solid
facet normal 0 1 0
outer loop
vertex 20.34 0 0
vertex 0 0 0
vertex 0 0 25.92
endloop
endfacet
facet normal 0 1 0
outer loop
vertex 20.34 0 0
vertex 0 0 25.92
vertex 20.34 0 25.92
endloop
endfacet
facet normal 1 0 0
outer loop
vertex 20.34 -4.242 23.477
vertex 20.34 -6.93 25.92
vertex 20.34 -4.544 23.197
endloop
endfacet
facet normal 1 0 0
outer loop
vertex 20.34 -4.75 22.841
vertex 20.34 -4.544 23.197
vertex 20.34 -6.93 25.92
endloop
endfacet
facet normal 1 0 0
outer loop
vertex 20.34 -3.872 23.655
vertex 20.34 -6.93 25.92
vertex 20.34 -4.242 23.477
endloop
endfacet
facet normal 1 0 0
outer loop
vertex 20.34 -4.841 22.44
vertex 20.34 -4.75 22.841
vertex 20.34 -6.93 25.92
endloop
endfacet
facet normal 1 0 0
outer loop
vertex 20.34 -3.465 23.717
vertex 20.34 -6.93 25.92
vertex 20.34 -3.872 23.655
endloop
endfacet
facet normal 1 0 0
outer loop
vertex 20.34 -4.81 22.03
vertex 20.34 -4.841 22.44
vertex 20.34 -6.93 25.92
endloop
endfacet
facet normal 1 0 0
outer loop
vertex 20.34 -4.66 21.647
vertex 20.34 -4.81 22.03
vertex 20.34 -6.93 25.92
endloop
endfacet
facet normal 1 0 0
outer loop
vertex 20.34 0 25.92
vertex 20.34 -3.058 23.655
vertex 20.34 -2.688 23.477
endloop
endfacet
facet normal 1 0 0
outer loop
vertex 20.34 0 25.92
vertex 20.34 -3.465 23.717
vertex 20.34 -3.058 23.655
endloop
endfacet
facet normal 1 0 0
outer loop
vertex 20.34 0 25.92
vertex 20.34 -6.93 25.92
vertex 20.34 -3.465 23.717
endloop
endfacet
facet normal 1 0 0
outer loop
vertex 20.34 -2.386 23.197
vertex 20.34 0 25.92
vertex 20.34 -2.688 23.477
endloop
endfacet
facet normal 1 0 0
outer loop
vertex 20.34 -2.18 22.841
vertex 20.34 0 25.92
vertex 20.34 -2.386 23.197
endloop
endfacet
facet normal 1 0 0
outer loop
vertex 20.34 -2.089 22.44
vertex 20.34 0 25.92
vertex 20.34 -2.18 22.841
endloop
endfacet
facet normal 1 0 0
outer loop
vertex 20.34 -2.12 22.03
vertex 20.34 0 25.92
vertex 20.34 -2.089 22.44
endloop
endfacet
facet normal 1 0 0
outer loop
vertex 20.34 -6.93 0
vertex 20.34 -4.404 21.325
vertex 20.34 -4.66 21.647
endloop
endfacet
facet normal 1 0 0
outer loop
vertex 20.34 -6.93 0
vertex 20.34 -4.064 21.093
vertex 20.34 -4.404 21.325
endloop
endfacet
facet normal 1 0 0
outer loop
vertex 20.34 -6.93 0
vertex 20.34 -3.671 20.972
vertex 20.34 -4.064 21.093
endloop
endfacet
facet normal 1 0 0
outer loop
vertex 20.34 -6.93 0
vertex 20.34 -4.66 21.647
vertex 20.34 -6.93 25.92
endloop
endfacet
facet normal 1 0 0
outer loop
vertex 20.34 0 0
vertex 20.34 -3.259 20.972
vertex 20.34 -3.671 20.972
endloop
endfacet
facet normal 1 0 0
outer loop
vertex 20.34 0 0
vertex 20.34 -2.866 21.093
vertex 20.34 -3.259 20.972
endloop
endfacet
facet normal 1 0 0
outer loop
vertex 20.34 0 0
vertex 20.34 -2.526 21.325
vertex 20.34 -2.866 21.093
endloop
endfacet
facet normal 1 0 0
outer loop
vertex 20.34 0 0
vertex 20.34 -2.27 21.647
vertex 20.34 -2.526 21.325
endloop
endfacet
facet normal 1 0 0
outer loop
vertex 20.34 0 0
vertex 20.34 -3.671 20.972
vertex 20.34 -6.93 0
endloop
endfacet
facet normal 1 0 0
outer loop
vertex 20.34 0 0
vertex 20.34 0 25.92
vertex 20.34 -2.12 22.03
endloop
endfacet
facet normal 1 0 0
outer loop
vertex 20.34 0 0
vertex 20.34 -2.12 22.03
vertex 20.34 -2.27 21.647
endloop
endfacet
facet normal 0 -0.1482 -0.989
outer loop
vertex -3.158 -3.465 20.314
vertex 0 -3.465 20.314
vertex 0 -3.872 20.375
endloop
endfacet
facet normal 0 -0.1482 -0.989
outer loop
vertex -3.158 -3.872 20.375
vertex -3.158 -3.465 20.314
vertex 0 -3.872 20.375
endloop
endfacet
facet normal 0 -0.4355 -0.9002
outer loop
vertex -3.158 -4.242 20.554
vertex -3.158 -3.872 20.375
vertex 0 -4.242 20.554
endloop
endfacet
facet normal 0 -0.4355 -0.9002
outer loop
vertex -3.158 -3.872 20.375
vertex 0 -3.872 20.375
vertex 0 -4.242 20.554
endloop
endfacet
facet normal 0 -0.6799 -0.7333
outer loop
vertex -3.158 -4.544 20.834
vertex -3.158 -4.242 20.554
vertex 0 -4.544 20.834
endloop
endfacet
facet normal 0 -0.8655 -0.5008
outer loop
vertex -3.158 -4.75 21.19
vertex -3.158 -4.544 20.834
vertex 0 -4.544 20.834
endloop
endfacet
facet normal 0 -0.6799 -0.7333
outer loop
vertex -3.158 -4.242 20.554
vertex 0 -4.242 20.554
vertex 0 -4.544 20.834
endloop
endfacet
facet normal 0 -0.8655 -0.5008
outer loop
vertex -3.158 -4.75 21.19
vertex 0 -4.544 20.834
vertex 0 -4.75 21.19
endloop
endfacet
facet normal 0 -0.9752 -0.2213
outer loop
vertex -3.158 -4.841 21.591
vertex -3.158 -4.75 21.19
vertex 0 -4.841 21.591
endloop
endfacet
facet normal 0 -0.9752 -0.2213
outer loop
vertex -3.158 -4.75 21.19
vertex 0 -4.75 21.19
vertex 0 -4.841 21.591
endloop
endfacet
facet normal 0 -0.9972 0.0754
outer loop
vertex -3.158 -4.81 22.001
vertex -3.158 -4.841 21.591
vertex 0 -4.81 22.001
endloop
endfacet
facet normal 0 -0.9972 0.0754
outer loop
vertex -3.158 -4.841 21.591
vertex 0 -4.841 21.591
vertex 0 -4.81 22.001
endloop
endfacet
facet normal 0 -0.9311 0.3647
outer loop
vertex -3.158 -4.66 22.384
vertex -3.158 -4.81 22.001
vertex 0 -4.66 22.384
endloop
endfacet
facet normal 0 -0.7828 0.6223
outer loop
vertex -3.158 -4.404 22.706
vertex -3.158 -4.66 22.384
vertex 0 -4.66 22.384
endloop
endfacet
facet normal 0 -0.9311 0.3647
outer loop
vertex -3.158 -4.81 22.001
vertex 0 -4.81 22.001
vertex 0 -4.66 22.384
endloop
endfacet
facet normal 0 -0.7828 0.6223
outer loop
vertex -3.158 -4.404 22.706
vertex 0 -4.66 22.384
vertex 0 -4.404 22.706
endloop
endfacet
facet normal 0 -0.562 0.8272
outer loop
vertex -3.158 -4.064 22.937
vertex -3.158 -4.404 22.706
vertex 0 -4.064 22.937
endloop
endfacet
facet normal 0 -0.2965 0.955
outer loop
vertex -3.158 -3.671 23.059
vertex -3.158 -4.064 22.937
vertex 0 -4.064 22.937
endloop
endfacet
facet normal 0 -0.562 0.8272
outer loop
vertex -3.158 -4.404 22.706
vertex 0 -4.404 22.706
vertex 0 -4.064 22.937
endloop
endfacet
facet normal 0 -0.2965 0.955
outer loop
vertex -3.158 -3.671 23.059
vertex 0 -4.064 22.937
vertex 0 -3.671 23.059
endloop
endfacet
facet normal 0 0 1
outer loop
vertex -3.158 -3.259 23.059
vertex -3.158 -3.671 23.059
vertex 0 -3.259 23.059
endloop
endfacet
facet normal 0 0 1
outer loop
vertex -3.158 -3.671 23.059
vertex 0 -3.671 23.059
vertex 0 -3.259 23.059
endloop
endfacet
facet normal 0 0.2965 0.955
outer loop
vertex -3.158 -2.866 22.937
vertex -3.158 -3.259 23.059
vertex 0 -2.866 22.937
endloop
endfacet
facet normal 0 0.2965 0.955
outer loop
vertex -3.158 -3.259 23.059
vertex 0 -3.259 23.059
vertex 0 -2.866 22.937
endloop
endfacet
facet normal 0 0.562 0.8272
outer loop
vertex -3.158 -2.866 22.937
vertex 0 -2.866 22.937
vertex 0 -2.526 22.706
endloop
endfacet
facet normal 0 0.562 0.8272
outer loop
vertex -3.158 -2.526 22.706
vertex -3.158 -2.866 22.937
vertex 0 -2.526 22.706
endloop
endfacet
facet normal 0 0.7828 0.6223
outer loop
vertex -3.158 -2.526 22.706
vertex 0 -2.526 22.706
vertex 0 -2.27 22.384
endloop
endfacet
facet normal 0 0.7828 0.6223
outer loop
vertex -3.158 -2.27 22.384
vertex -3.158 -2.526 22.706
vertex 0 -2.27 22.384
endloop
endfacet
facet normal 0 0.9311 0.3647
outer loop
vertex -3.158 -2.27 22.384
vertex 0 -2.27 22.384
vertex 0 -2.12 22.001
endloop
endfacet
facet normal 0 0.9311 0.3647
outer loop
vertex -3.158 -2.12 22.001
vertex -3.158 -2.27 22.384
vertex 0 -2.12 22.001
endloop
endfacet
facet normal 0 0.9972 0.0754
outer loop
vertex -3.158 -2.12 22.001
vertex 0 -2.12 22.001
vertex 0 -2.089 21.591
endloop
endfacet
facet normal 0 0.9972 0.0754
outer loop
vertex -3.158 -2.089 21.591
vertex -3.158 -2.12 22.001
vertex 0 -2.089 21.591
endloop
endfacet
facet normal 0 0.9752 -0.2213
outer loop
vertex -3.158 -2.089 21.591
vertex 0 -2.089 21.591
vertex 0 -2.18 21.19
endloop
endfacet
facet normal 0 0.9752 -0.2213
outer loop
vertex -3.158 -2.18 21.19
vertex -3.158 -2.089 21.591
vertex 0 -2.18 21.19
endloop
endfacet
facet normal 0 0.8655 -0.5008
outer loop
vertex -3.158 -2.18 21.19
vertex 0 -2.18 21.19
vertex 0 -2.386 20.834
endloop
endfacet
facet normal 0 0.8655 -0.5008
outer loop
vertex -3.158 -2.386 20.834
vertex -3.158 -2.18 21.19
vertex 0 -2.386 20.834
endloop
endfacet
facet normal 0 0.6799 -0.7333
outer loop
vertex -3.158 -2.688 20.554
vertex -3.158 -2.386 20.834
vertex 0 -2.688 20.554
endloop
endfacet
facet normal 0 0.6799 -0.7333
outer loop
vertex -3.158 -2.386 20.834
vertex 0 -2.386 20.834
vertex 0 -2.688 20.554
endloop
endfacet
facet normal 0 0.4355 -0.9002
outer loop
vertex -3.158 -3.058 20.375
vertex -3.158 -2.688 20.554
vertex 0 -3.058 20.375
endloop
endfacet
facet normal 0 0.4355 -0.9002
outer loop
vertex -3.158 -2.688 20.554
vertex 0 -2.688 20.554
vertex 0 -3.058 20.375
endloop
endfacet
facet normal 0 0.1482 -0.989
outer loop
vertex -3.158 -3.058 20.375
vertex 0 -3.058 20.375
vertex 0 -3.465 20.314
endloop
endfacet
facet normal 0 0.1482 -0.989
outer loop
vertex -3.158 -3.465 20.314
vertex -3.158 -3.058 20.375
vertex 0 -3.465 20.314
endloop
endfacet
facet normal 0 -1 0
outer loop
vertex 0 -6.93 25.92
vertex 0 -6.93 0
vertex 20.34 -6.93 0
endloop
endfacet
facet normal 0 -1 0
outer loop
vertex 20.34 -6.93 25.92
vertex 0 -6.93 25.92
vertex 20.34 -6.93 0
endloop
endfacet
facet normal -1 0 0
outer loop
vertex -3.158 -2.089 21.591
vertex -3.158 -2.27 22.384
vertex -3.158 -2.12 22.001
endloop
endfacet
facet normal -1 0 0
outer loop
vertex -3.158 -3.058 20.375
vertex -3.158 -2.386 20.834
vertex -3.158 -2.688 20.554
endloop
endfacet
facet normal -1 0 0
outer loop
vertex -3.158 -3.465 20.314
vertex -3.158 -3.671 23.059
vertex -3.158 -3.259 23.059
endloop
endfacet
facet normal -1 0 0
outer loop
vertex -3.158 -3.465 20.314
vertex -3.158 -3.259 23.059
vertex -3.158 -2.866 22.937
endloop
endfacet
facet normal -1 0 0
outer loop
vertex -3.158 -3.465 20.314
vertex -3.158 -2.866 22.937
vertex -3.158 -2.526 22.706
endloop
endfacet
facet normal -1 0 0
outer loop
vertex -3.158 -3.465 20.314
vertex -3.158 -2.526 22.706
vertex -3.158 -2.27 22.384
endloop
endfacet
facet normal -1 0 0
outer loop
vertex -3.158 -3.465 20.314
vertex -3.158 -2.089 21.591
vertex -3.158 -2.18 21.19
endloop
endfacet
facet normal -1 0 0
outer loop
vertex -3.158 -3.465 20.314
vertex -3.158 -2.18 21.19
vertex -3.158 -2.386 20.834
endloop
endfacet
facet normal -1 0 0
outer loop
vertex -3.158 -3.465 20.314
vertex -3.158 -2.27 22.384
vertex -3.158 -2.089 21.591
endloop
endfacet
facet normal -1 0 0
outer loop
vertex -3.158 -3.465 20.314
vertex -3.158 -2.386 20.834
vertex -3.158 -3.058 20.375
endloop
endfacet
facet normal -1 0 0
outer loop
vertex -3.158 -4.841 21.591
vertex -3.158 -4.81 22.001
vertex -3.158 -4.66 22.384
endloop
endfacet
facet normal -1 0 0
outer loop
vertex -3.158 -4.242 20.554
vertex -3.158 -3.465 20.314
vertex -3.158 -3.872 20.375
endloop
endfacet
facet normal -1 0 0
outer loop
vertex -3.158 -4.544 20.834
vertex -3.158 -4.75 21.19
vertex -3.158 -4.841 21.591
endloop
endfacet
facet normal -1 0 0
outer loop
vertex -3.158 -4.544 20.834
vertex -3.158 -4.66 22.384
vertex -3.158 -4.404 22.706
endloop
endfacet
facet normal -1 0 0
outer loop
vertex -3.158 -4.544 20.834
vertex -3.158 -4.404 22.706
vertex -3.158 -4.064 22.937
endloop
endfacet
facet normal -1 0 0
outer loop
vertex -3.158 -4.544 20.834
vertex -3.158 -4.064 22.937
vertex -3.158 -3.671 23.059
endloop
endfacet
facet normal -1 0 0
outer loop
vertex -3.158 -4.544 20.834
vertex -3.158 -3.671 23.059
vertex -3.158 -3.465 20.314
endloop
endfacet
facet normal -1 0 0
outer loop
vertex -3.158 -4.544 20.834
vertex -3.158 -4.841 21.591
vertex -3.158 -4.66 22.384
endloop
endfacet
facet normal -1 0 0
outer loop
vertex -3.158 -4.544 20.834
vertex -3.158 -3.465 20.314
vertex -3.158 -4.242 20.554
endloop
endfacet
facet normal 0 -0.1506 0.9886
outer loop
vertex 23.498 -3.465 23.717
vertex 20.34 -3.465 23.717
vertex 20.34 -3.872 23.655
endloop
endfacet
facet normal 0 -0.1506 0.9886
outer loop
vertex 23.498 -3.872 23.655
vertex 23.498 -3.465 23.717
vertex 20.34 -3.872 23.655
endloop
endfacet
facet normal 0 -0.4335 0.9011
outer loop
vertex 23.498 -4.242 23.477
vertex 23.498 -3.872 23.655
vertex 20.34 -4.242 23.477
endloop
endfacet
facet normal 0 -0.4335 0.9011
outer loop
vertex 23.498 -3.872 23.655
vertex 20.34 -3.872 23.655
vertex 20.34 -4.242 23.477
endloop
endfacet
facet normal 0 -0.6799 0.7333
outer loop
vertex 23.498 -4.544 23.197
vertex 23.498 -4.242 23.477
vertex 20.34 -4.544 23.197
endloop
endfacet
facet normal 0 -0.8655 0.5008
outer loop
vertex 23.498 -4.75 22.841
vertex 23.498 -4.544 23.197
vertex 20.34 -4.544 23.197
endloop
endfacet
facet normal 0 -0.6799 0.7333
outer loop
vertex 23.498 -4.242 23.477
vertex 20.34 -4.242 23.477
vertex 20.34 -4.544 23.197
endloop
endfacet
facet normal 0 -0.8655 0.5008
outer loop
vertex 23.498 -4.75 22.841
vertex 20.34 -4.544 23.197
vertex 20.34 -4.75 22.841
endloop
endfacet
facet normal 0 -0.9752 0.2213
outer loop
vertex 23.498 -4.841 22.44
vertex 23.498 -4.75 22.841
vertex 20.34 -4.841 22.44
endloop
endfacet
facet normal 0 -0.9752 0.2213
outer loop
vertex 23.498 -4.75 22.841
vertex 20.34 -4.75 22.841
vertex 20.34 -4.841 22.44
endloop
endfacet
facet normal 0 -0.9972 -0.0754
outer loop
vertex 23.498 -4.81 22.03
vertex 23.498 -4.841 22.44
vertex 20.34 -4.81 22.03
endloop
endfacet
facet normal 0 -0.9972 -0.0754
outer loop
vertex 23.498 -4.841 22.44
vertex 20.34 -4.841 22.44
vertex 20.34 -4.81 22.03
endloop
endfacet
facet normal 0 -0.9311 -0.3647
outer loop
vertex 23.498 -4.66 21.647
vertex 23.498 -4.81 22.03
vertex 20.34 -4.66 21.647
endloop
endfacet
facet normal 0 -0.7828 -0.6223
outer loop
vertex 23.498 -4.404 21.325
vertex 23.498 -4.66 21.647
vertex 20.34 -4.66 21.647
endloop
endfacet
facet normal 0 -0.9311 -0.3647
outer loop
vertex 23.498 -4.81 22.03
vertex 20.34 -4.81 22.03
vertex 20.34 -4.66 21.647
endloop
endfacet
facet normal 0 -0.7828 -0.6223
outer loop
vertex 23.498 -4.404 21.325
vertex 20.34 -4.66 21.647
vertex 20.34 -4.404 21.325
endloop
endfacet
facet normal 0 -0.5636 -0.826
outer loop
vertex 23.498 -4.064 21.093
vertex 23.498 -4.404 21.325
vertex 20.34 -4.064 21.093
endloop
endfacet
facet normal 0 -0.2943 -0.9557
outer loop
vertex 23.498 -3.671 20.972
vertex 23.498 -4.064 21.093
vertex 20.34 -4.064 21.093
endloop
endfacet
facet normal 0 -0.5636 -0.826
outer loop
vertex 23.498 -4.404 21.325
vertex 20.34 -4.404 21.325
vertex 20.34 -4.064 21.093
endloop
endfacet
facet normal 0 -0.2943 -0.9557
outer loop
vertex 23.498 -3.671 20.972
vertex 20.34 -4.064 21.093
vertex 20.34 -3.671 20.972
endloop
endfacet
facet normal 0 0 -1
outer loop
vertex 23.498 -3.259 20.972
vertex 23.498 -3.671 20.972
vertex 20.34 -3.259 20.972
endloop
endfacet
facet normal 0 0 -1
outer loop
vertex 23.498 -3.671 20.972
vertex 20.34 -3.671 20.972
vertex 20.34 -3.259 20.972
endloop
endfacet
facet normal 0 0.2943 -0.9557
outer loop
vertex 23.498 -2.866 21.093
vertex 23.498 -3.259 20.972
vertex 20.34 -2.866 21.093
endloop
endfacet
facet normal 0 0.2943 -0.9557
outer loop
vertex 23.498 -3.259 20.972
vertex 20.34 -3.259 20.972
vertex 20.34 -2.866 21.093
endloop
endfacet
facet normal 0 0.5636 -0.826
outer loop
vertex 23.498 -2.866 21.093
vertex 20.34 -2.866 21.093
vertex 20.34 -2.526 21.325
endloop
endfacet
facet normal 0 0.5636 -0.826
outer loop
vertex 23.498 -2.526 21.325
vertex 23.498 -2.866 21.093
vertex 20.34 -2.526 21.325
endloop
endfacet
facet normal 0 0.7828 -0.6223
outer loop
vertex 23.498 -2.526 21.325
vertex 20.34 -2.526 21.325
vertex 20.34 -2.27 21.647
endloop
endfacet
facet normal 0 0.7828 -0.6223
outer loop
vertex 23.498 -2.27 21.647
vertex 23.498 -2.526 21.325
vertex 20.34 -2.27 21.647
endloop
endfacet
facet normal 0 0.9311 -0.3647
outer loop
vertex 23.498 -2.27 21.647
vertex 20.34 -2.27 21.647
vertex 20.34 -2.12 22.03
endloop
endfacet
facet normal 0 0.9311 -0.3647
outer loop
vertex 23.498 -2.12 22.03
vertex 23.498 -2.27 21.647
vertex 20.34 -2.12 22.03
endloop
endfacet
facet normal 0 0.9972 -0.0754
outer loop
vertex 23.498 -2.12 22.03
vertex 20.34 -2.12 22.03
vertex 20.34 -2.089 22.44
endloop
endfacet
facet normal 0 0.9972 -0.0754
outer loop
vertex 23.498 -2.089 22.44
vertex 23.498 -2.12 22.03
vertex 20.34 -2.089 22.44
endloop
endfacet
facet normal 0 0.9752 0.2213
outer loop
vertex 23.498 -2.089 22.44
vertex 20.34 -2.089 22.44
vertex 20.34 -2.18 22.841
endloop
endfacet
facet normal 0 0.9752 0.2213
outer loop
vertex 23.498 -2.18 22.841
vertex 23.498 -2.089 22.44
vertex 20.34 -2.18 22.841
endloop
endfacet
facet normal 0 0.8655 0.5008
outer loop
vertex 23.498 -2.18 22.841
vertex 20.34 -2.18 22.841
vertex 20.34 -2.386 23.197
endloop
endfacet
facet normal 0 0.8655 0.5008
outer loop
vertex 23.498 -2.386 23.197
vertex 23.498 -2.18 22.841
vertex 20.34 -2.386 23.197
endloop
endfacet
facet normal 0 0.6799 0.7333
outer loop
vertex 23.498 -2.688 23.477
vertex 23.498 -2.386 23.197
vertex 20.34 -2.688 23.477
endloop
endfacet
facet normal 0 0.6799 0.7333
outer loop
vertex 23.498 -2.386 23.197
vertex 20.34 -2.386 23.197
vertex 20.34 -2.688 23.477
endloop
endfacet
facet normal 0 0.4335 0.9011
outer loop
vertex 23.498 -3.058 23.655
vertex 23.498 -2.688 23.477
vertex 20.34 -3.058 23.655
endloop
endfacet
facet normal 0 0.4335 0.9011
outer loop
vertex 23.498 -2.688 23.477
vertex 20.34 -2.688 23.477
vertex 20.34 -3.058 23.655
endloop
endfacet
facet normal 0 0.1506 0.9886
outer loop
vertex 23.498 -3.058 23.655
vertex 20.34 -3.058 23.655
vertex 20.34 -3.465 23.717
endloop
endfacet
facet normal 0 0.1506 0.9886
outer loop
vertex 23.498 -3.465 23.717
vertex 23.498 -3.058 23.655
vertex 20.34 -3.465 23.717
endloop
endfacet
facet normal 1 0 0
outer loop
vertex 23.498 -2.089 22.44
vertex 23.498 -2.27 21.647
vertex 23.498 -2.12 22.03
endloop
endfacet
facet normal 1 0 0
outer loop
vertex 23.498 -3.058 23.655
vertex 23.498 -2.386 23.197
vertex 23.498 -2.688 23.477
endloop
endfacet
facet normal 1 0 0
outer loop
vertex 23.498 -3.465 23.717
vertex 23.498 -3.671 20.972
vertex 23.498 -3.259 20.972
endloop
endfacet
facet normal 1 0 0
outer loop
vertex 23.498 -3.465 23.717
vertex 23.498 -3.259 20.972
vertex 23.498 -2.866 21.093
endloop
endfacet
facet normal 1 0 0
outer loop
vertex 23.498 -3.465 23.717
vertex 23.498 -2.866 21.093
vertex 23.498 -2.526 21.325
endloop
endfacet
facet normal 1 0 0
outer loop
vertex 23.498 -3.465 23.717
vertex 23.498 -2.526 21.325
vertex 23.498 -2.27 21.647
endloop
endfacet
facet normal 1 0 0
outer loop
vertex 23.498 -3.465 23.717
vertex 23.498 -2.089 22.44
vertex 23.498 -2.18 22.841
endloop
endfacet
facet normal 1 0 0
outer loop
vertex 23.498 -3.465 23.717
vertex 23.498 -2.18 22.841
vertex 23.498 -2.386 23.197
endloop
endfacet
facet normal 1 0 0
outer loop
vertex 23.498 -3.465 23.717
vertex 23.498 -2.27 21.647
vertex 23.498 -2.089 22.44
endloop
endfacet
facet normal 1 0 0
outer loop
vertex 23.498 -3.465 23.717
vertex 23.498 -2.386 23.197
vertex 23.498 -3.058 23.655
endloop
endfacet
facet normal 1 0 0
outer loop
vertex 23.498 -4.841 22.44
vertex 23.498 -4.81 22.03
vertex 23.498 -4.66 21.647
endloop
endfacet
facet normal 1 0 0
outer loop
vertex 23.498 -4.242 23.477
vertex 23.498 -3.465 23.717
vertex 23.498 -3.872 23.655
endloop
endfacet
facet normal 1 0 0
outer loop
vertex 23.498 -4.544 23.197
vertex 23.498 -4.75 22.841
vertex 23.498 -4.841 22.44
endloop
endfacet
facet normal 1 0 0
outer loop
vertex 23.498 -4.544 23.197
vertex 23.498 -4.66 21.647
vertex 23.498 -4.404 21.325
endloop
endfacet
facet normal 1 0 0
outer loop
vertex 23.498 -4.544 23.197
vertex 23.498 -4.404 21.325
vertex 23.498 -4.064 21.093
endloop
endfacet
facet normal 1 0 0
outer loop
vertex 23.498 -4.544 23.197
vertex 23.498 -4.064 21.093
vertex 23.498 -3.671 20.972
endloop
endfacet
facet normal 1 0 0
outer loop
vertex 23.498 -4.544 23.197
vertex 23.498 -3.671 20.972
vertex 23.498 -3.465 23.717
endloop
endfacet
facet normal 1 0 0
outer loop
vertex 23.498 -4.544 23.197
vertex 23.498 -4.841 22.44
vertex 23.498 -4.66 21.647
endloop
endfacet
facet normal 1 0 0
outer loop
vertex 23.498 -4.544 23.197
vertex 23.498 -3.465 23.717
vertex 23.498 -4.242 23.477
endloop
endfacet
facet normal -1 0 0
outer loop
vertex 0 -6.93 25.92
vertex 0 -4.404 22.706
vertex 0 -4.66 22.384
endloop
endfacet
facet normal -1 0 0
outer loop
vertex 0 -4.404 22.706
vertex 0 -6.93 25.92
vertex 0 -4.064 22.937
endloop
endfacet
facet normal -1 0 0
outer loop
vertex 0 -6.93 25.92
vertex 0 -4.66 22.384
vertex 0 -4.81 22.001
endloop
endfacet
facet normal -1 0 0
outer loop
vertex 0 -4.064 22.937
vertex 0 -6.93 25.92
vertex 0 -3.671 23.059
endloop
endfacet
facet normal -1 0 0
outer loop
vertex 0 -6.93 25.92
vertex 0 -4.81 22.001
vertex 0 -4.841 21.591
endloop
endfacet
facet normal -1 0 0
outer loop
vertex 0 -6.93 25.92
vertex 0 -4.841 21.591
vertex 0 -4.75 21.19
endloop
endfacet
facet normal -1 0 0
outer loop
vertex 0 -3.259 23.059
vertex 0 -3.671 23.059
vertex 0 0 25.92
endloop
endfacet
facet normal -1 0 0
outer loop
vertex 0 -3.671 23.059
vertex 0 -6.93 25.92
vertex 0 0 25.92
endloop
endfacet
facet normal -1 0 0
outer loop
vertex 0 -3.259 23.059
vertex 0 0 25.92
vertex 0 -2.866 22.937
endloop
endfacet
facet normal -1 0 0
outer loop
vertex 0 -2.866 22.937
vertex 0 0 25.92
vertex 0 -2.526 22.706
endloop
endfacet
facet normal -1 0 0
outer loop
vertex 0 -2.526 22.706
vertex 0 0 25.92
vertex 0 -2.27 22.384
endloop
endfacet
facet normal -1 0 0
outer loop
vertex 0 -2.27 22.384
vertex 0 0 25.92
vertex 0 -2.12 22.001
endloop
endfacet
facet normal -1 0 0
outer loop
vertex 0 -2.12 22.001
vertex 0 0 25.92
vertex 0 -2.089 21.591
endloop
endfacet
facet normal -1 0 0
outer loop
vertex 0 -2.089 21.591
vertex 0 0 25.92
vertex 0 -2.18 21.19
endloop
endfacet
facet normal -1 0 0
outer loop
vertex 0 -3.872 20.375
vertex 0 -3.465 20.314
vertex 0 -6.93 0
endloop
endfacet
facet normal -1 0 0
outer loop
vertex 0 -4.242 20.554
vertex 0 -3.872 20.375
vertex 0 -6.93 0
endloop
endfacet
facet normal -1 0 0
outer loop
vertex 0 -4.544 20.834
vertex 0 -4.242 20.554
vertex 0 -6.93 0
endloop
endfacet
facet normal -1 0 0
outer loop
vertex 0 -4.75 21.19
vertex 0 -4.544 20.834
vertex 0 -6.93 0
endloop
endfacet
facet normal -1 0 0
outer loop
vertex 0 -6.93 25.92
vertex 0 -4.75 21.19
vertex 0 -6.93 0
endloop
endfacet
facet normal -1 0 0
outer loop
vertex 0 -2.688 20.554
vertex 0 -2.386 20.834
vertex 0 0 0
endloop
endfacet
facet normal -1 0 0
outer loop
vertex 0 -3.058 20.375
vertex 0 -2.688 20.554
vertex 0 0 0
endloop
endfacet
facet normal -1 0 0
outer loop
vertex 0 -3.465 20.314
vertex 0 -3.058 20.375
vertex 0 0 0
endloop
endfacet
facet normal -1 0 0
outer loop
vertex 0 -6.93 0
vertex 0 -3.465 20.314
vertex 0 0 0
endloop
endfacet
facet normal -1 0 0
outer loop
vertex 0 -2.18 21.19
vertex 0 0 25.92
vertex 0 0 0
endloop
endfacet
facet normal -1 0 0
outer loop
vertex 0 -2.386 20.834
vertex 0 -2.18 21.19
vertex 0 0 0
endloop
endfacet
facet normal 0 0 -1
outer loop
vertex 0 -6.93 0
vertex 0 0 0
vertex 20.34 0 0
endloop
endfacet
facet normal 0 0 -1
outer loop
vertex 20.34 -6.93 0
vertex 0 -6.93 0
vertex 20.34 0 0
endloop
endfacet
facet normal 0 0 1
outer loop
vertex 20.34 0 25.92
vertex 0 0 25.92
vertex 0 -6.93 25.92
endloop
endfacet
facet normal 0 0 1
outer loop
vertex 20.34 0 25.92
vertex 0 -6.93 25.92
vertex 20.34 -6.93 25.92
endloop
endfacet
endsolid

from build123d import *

# Parameters (mm, degrees)
SKETCH1_W           = 20.34
SKETCH1_H           = 25.92
BOSS_EXTRUDE2_DEPTH = 6.93
SKETCH3_R           = 1.38
BOSS_EXTRUDE3_DEPTH = 3.158
SKETCH6_R           = 1.38
BOSS_EXTRUDE4_DEPTH = 3.158


with BuildPart() as part:
    # Sketch1 → Boss-Extrude2 (new body)
    with BuildSketch(Plane(origin=(0, 0, 0), x_dir=(1, 0, 0), z_dir=(0, 1, 0))):
        with Locations((10.17, -12.96)):
            Rectangle(SKETCH1_W, SKETCH1_H)
    extrude(amount=-BOSS_EXTRUDE2_DEPTH)

    # Sketch3 → Boss-Extrude3 (add)
    with BuildSketch(Plane(origin=(20.34, 0, 0), x_dir=(0, 0, -1), z_dir=(1, 0, 0))):
        with Locations(Location((-22.336733694, -3.465, 0), (0, 0, 180))):
            Circle(SKETCH3_R)
    extrude(amount=BOSS_EXTRUDE3_DEPTH)

    # Sketch6 → Boss-Extrude4 (add)
    with BuildSketch(Plane.ZY):
        with Locations(Location((21.694091509, -3.465, 0), (0, 0, 180))):
            Circle(SKETCH6_R)
    extrude(amount=BOSS_EXTRUDE4_DEPTH)


solid = part.part
